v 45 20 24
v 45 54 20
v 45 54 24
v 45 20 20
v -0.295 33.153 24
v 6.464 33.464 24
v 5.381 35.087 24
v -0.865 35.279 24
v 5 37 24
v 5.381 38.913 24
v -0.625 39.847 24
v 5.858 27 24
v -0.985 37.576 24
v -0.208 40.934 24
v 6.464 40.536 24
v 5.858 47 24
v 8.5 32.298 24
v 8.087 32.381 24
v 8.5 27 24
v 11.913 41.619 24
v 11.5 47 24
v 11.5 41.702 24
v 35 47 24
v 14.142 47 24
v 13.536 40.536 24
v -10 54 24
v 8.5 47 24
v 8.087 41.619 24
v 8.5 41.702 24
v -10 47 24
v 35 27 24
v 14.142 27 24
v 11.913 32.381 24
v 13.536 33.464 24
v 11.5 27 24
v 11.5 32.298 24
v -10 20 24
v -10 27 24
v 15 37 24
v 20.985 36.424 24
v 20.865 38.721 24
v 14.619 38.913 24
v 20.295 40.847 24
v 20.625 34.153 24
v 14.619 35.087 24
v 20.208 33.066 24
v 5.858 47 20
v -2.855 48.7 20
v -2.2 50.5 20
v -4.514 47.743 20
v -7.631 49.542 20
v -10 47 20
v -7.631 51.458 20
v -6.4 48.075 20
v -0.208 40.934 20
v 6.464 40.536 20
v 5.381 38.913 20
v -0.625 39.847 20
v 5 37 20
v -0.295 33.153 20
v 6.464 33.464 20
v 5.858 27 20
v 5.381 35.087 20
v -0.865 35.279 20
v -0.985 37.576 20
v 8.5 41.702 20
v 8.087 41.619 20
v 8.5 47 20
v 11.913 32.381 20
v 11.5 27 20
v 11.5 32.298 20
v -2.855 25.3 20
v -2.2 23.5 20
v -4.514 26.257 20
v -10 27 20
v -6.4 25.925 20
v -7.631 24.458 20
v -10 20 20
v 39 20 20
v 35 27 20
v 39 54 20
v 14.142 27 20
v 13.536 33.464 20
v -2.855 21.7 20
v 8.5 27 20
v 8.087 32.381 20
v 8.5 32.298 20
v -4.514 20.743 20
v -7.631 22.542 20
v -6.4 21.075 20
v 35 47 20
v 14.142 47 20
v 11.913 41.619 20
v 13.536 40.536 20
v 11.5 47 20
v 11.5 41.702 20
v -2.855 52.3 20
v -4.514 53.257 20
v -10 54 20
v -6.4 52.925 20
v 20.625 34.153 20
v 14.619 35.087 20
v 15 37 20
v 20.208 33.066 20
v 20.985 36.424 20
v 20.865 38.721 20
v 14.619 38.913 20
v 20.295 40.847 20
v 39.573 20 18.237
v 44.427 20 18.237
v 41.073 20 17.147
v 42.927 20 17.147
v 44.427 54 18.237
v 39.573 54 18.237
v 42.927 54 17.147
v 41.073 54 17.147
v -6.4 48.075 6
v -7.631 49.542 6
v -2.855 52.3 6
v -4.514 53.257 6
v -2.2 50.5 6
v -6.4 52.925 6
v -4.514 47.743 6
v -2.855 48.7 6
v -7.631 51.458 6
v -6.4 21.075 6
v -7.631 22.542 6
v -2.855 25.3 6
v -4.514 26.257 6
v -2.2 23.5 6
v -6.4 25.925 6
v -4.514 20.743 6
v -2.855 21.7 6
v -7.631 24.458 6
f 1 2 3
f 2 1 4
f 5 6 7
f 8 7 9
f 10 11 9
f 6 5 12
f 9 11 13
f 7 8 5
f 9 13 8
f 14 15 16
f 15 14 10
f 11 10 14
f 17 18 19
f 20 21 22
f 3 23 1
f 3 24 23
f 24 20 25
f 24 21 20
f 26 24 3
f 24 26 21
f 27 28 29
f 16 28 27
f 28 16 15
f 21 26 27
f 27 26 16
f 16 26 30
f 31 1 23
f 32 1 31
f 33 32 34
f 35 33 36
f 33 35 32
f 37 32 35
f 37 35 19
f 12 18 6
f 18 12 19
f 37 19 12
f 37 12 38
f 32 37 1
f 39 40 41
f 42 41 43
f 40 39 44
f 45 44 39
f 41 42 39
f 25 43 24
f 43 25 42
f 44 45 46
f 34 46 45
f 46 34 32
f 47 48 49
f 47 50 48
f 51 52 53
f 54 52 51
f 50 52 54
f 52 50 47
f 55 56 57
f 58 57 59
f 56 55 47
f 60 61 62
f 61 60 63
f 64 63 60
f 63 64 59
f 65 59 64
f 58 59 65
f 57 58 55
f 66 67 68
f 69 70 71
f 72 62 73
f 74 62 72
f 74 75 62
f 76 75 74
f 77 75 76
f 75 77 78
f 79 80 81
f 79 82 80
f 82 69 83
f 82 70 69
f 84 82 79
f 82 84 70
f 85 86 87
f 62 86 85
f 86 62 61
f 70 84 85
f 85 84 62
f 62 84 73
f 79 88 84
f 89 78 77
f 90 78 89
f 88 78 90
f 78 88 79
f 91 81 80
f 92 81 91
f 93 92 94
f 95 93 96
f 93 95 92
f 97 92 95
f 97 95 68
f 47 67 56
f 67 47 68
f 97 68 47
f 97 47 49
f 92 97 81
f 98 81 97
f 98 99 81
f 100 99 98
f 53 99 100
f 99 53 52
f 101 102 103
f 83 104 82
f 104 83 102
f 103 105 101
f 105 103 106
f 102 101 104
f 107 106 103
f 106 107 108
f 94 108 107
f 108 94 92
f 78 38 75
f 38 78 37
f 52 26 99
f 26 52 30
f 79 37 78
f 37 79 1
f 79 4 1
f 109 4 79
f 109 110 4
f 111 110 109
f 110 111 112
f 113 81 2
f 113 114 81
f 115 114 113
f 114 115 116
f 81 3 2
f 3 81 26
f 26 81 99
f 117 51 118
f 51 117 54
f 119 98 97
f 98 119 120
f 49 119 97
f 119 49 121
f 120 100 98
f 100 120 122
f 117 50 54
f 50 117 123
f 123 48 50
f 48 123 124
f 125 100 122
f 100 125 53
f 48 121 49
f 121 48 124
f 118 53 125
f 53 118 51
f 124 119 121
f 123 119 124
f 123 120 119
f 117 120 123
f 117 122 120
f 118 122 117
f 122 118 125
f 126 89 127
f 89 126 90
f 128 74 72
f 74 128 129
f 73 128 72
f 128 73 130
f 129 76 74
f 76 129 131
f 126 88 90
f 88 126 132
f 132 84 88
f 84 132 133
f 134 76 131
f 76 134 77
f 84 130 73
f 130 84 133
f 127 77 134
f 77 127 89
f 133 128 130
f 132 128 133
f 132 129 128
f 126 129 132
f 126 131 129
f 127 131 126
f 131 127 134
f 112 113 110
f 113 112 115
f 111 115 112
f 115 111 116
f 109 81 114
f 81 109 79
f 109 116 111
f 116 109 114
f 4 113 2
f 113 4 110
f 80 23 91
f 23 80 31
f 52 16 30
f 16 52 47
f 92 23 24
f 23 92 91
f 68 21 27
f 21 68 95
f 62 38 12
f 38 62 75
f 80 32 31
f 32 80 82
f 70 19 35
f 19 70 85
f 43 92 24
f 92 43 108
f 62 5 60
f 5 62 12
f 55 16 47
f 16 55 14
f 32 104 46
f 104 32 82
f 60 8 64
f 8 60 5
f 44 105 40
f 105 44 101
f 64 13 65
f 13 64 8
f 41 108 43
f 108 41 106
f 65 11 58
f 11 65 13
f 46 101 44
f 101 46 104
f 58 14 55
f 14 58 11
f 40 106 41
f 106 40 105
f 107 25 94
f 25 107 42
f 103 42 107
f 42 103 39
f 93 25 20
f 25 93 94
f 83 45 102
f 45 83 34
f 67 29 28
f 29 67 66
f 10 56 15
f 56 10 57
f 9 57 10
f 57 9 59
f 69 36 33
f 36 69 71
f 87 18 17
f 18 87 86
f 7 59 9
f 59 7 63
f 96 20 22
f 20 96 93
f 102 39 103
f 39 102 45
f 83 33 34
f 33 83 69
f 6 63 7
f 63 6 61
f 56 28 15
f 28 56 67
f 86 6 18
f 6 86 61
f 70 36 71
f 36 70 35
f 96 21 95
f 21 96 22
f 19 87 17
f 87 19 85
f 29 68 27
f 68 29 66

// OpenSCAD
difference(){union(){translate([-10,20,20])cube([55,20,4]);
translate([-10,34,20])cube([55,20,4]);
translate([-5,50.5,6])cylinder(r=2.8,h=15);
translate([-5,23.5,6])cylinder(r=2.8,h=15);
translate([42,54,20])rotate([90,0,0])cylinder(r=3,h=34);}

translate([-10,27,20])cube([45,20,4]);}

difference(){translate([10,37,20])rotate(45,0,0)intersection(){translate([-10,-10,0])cube([20,20,4]);
cylinder(r=11,h=6);}
translate([10,37,20])cylinder(r=5,h=15);
translate([8.5,27,20])cube([3,50,20]);}
